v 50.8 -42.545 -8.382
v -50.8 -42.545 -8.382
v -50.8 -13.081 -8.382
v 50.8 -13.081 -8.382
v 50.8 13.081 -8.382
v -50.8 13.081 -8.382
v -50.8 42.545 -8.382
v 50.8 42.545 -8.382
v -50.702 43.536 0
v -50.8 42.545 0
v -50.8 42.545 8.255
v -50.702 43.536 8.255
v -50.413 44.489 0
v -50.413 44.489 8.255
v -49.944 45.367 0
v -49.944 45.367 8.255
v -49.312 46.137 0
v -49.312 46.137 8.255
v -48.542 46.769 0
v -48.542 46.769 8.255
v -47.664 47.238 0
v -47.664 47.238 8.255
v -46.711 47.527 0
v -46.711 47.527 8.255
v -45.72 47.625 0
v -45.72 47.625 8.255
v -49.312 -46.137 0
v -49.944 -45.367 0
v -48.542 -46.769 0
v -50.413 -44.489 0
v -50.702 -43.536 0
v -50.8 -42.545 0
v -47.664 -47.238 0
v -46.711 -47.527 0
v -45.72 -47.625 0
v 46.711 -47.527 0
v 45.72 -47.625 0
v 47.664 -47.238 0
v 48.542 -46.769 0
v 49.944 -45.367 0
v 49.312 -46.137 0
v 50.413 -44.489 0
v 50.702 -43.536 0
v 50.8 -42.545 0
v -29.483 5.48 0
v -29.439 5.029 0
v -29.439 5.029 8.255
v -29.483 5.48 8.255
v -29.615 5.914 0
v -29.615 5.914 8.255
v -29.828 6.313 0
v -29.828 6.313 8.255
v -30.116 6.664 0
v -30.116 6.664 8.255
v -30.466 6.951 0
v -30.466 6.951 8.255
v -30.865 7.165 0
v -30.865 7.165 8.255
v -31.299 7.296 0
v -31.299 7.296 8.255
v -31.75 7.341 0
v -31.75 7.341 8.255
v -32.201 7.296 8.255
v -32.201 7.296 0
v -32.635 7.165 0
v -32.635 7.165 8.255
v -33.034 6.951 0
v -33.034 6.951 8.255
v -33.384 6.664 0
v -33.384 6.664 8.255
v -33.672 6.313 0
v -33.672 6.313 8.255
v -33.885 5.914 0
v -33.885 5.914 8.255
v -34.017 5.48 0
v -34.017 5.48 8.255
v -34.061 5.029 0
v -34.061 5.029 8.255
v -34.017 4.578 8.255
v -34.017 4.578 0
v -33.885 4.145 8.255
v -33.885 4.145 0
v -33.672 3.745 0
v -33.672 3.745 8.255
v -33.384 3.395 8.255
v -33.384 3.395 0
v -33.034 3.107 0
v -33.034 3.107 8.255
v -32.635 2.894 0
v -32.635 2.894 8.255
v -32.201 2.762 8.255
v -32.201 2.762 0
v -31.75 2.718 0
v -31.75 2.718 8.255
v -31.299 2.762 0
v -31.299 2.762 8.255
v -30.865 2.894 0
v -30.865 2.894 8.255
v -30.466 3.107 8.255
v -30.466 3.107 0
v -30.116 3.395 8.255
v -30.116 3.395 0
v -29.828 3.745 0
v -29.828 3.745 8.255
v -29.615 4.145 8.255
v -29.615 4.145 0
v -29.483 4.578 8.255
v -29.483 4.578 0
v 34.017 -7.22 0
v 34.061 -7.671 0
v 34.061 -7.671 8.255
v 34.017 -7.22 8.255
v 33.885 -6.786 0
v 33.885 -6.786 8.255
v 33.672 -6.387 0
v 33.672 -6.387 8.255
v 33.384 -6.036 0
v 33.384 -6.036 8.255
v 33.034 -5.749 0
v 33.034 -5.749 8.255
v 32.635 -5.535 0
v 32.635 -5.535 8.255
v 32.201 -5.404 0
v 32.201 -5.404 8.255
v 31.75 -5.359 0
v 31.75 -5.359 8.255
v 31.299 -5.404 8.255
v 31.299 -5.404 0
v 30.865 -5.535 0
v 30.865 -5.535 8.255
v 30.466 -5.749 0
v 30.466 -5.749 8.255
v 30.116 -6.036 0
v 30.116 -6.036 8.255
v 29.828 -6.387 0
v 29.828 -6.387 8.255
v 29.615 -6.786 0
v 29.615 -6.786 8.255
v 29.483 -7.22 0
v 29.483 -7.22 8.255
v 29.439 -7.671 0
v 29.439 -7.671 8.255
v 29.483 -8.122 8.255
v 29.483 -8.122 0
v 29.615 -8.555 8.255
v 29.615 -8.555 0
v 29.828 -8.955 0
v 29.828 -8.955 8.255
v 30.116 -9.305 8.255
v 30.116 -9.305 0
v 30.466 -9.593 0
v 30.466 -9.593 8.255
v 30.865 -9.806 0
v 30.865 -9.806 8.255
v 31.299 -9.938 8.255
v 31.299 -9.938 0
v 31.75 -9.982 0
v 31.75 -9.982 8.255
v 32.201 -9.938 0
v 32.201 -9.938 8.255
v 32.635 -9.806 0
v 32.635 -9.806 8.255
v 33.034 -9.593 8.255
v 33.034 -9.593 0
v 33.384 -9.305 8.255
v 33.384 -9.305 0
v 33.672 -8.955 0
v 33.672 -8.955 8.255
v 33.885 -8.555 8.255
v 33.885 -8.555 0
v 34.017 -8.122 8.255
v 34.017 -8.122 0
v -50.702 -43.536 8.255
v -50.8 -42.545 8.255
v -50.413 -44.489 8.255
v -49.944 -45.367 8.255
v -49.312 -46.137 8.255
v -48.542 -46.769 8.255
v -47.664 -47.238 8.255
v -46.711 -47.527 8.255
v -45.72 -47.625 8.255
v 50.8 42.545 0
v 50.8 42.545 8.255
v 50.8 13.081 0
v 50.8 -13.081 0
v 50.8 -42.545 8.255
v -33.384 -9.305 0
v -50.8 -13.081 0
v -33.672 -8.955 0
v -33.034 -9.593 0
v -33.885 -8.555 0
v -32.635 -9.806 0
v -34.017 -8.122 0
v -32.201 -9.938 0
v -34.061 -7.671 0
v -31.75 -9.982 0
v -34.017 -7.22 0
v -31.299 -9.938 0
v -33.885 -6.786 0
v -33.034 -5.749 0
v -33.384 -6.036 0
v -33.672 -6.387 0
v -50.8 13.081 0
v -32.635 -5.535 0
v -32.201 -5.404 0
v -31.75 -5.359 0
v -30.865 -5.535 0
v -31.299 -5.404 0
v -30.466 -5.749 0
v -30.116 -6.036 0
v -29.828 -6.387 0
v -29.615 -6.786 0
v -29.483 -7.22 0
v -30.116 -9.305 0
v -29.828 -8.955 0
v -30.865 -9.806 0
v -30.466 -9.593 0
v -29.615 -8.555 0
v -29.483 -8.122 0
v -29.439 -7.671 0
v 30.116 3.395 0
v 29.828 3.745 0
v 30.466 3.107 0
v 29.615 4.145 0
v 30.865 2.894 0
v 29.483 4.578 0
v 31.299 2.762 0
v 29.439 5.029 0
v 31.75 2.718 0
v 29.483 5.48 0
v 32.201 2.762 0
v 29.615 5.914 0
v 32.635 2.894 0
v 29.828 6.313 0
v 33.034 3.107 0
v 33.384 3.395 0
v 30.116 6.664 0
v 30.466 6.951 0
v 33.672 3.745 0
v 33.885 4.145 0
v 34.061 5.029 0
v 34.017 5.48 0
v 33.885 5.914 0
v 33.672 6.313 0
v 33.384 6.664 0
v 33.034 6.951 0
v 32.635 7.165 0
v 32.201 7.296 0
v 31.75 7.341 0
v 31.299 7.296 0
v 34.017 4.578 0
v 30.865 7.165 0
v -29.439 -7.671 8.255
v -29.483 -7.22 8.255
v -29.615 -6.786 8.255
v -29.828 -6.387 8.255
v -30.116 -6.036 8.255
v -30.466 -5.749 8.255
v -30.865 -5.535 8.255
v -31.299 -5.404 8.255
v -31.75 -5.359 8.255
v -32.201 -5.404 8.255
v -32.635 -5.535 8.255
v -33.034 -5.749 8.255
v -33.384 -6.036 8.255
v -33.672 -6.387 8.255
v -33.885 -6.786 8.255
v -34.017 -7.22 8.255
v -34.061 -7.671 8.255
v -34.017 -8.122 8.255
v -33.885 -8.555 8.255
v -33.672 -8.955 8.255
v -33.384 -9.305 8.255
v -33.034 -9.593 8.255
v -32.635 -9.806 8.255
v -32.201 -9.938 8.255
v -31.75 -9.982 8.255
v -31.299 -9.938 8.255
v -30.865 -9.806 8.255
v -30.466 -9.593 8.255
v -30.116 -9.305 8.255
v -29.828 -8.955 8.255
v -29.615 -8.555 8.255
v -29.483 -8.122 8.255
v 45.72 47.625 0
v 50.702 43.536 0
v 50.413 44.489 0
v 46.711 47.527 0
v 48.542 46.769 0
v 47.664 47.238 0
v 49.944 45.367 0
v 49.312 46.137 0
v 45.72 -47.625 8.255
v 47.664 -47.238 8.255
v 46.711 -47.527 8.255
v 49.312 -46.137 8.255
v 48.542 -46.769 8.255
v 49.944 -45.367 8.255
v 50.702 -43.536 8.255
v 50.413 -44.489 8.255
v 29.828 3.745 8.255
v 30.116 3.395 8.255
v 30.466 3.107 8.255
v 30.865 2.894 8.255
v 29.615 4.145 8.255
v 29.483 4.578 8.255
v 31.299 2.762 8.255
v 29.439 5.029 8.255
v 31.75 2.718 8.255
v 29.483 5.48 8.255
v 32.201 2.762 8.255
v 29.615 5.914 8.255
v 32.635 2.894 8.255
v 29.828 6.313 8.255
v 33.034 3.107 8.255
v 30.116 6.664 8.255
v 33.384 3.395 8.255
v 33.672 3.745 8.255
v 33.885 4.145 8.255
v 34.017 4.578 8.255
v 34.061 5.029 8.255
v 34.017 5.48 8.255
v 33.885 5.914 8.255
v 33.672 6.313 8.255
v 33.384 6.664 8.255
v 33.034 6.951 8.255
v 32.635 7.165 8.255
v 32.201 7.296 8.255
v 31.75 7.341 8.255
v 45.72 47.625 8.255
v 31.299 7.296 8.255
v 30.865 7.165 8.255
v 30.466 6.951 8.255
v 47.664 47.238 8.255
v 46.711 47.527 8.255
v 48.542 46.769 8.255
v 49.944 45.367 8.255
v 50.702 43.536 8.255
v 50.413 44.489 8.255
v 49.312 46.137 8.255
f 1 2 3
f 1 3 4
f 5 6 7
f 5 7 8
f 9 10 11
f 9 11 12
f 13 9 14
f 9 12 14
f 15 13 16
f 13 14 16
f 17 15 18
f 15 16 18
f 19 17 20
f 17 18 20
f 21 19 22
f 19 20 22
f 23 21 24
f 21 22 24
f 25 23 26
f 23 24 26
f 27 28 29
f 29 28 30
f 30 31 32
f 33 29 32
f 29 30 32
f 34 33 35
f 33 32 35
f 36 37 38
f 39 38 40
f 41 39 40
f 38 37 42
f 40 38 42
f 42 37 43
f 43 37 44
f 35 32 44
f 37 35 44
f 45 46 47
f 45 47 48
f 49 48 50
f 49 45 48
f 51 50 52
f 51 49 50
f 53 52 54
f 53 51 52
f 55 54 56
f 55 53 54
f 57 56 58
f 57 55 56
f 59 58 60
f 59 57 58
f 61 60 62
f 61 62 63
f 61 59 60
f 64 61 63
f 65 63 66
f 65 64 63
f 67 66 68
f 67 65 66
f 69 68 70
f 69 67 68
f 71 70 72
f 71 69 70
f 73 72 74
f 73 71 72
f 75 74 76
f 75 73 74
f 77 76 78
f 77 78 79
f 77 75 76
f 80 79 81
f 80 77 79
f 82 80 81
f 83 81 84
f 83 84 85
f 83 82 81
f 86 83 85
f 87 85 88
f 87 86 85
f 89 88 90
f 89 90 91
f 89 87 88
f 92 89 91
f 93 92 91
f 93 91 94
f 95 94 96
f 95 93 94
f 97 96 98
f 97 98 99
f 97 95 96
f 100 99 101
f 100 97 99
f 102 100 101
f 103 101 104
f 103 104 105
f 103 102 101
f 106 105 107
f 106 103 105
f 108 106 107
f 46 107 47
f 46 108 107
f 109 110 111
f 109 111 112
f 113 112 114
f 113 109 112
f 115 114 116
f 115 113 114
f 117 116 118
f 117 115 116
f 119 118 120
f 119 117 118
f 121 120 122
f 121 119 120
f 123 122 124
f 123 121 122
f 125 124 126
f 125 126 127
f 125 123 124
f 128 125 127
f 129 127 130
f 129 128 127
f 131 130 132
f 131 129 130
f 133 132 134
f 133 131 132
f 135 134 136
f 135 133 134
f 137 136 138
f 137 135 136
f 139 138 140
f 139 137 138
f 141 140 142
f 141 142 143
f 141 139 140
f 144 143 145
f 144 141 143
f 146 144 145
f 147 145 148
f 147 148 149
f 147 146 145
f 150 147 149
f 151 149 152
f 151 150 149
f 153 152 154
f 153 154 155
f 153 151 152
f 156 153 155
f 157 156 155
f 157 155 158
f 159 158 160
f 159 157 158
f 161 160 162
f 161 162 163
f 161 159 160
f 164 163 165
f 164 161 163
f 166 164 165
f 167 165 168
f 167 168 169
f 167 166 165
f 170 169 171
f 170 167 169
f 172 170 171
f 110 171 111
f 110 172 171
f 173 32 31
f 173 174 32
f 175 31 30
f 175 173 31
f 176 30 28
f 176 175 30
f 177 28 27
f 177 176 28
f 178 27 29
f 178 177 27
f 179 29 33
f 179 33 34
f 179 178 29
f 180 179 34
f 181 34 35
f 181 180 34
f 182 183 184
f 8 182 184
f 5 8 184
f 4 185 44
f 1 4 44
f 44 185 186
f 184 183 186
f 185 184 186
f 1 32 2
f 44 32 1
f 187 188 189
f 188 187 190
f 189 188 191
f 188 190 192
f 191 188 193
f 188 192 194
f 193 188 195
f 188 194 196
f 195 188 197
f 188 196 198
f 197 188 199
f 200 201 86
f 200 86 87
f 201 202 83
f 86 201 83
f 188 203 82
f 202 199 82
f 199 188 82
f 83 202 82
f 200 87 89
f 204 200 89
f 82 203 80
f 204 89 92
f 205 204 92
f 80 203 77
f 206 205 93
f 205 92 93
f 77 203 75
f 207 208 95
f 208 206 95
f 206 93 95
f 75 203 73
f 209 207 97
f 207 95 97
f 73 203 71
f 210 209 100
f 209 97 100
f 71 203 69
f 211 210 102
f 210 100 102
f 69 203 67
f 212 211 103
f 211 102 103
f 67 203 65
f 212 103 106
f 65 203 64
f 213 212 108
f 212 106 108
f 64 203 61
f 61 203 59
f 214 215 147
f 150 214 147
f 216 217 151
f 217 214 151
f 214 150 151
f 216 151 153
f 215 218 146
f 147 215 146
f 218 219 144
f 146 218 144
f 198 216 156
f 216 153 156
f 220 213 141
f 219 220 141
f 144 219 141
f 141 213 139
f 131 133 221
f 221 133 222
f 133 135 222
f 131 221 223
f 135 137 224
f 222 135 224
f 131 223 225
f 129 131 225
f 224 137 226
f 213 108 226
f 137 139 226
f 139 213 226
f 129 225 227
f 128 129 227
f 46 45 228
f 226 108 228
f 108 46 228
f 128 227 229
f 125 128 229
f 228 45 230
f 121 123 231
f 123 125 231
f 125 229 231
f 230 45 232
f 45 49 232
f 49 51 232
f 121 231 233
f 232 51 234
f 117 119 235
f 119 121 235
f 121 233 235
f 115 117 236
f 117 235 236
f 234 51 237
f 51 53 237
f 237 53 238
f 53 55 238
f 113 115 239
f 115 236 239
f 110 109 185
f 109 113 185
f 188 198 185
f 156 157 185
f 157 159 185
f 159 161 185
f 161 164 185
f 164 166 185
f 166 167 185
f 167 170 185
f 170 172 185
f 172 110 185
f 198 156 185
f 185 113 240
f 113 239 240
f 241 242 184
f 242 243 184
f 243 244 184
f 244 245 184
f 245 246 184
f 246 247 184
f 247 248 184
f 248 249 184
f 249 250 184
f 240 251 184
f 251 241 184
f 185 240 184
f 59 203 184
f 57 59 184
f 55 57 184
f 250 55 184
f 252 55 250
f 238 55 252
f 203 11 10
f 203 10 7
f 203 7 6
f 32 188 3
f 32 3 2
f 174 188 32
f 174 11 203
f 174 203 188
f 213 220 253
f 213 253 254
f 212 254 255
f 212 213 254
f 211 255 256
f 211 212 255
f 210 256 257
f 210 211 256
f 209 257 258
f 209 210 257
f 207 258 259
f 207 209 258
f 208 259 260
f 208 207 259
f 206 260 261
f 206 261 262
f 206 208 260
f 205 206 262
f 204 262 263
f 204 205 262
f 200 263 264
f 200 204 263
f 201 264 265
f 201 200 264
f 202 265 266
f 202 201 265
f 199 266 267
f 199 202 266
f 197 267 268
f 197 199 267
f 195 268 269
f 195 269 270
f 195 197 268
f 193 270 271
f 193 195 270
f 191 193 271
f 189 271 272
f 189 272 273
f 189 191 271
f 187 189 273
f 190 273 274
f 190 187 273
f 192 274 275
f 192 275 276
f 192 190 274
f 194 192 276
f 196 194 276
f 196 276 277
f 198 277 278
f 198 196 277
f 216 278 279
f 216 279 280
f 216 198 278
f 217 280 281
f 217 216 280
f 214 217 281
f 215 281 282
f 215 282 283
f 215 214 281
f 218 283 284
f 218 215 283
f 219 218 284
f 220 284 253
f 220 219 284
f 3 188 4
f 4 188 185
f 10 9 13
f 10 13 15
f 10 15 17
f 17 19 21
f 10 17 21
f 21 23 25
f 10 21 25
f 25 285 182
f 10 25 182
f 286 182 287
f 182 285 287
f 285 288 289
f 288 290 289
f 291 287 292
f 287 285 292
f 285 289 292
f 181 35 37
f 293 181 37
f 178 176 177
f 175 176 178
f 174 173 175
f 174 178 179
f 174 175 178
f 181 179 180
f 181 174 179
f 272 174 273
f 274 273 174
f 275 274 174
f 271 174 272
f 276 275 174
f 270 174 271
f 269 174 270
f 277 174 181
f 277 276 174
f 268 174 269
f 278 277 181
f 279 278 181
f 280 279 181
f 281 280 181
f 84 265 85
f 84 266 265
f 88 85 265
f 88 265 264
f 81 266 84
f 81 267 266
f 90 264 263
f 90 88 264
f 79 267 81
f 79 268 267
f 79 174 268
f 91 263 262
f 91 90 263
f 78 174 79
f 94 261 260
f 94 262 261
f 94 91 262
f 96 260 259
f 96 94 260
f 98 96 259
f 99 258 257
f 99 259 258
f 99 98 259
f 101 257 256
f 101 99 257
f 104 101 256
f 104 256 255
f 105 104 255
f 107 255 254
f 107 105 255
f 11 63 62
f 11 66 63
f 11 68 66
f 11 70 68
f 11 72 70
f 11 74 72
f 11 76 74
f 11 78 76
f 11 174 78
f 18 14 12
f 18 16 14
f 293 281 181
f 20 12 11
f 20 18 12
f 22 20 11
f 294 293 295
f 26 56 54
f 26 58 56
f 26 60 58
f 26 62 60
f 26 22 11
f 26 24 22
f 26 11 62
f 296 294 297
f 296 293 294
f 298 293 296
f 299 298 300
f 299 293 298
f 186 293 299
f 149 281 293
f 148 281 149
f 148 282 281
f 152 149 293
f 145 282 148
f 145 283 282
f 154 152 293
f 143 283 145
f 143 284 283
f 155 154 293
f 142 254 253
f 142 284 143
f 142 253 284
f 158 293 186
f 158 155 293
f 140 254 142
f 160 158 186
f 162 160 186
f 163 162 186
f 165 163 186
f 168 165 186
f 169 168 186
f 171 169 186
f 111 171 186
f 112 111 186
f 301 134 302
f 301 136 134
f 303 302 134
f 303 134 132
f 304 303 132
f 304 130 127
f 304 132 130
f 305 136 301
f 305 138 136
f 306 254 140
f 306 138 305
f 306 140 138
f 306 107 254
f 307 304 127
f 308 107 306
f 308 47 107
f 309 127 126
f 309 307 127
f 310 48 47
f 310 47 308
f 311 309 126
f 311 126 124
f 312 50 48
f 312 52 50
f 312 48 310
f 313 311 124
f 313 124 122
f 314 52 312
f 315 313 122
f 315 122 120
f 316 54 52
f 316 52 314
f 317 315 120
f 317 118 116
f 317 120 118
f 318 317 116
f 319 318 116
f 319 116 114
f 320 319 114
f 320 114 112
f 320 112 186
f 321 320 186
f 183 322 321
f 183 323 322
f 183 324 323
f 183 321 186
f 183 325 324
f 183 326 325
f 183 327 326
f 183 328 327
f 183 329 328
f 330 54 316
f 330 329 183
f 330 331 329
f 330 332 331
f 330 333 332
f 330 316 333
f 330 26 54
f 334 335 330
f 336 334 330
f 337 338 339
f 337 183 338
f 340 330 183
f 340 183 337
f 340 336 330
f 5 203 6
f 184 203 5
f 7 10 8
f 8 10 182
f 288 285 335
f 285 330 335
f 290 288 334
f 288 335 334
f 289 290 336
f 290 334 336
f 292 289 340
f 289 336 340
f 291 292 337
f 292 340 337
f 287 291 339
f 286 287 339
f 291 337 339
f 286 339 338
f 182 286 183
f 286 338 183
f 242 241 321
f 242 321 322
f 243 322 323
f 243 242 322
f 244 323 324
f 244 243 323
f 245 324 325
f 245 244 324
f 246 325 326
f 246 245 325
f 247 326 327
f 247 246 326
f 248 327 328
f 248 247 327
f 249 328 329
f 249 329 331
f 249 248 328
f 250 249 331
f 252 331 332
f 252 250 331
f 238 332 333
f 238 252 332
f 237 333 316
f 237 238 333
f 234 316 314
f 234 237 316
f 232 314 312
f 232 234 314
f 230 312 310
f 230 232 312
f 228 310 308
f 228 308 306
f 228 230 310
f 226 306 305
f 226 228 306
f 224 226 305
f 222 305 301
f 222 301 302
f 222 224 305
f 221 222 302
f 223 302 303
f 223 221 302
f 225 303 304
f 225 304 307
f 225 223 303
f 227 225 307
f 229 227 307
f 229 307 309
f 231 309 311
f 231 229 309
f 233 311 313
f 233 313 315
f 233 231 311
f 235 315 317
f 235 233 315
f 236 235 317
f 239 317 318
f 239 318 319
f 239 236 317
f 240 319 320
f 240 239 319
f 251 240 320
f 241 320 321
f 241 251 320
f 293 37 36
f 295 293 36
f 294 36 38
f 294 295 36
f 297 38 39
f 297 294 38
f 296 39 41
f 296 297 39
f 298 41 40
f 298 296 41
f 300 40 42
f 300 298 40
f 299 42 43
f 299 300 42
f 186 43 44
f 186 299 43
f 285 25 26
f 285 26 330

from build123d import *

# Parameters (mm, degrees)
F0_W     = 101.6
F0_H     = 95.25
F0_R     = 2.3114
F1_DEPTH = 8.255
F2_R     = 5.08
F3_W     = 101.6
F3_H     = 29.464
F4_DEPTH = 8.382


# Not quite as in the source:
# - a feature names something its author has since deleted; it is built from what else it names


with BuildPart() as f1:
    # F0 (on Top) → F1 (new body)
    with BuildSketch(Plane.XY):
        Rectangle(F0_W, F0_H)
        Polygon((38.1, -15.24), (0, -15.24), (-38.1, -15.24), (-38.1, 15.24), (-25.4, 15.24), (0, 15.24), (25.4, 15.24), (38.1, 15.24), align=None, mode=Mode.SUBTRACT)
        Polygon((-38.1, -15.24), (0, -15.24), (38.1, -15.24), (38.1, 15.24), (25.4, 15.24), (0, 15.24), (-25.4, 15.24), (-38.1, 15.24), align=None)
        with Locations((-31.75, -7.6708)):
            Circle(F0_R, mode=Mode.SUBTRACT)
        with Locations((31.75, -7.6708)):
            Circle(F0_R, mode=Mode.SUBTRACT)
        with Locations((-31.75, 5.0292)):
            Circle(F0_R, mode=Mode.SUBTRACT)
        with Locations((31.75, 5.0292)):
            Circle(F0_R, mode=Mode.SUBTRACT)
    extrude(amount=F1_DEPTH)

    # F2
    f2_edges = [f1.edges().sort_by_distance(p)[0] for p in [
        (-50.8, 47.625, 4.1275),
        (50.8, 47.625, 4.1275),
        (50.8, -47.625, 4.1275),
        (-50.8, -47.625, 4.1275),
    ]]
    fillet(f2_edges, radius=F2_R)

    # F3 (on face) → F4 (join)
    with BuildSketch(Plane(origin=(0, 0, 0), x_dir=(1, 0, 0), z_dir=(0, 0, -1))):
        with Locations((0, 27.813)):
            Rectangle(F3_W, F3_H)
        with Locations((0, -27.813)):
            Rectangle(F3_W, F3_H)
    extrude(amount=F4_DEPTH)


solid = f1.part
